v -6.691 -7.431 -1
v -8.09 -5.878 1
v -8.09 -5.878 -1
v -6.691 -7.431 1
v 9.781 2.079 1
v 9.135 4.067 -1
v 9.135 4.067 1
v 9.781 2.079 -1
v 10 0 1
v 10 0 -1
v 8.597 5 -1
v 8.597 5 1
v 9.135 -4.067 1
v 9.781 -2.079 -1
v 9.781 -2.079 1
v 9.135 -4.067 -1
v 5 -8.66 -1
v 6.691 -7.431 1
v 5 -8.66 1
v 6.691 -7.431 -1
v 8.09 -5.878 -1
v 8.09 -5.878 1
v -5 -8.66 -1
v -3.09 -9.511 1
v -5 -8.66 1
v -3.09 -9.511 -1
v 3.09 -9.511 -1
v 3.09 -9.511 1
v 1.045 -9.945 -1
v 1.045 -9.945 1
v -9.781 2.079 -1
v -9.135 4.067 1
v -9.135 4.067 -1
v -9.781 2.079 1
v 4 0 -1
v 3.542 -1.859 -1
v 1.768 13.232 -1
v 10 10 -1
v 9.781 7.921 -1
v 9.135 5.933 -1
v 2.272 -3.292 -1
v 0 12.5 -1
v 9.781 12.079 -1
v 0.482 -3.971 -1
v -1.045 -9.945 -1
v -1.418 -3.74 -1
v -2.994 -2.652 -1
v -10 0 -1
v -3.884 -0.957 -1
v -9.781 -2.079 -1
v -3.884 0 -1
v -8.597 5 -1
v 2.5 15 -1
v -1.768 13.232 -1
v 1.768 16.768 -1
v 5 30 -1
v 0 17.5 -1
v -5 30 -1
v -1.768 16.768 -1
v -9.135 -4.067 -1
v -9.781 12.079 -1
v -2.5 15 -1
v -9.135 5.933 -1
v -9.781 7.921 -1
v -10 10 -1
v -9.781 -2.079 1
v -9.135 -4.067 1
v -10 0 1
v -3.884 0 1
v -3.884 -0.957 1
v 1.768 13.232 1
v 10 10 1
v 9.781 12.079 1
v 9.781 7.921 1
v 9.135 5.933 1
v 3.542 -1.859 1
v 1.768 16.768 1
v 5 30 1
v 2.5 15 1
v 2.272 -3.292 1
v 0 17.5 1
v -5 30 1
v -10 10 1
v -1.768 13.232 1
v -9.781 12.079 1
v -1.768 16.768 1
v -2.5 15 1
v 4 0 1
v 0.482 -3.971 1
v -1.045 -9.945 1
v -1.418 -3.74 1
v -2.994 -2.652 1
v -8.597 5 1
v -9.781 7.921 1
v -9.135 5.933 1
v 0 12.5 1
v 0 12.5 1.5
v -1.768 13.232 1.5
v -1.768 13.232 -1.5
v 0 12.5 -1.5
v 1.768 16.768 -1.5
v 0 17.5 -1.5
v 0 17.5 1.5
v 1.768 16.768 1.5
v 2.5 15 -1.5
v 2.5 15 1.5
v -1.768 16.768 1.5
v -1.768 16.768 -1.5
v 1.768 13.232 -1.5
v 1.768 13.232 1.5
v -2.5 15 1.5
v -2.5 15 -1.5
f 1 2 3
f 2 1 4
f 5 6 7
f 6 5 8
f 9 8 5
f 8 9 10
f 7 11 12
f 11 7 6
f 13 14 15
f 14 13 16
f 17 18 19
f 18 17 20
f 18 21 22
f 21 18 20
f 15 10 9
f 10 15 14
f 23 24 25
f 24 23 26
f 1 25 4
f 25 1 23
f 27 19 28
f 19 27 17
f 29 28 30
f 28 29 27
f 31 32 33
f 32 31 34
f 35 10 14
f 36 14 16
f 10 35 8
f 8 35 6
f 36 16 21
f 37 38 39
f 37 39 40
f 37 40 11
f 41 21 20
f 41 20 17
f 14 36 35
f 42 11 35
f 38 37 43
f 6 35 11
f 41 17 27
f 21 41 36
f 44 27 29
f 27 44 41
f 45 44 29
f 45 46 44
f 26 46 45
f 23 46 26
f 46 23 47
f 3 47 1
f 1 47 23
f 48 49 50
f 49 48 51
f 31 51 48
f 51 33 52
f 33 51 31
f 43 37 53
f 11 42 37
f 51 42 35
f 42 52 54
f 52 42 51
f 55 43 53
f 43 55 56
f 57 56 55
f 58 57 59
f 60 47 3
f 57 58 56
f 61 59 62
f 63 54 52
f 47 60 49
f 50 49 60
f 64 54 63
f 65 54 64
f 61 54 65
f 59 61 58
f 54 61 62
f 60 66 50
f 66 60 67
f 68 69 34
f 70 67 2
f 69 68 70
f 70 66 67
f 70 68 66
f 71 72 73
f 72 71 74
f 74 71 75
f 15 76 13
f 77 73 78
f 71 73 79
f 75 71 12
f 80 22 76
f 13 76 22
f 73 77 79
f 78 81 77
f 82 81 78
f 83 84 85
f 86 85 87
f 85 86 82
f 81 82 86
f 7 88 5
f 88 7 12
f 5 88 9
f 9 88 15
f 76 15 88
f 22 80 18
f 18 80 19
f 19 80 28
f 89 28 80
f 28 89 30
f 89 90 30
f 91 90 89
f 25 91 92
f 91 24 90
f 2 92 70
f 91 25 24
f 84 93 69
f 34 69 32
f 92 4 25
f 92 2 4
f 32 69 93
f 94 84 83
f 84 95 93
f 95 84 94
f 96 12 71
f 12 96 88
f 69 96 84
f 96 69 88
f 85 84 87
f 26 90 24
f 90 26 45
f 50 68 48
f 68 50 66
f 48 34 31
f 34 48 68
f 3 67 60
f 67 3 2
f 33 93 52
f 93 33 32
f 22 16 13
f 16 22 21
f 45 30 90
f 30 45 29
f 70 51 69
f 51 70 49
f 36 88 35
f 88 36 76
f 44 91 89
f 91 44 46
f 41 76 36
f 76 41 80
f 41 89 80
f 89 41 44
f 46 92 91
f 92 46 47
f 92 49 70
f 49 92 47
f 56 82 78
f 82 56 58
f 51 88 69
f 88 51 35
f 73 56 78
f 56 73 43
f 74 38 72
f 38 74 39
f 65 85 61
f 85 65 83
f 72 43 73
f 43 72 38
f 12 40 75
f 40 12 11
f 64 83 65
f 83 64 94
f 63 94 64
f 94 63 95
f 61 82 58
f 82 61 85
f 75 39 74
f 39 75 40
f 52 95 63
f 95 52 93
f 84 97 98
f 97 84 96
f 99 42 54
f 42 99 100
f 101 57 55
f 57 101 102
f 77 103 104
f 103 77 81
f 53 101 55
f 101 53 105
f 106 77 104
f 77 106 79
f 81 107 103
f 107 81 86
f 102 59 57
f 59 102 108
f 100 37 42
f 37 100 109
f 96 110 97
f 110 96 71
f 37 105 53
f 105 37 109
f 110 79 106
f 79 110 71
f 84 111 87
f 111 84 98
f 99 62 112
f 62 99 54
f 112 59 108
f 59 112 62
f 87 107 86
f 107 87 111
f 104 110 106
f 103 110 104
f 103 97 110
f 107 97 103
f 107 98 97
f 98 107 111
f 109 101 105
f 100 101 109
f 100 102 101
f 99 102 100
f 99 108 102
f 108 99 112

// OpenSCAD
// Parameters
ring_outer_diameter = 20;
ring_thickness = 2;
mounting_hole_diameter = 8;
tongue_length = 30;
tongue_width = 10;
tongue_thickness = 2;
wire_entry_diameter = 5;

// Ring body
module ring_body() {
    difference() {
        cylinder(d=ring_outer_diameter, h=ring_thickness, center=true);
        cylinder(d=mounting_hole_diameter, h=ring_thickness + 1, center=true);
    }
}

// Wire termination section (tongue)
module wire_termination_section() {
    translate([0, tongue_length/2, 0])
    cube([tongue_width, tongue_length, tongue_thickness], center=true);
}

// Transition fillet or hull between ring and tongue
module transition_fillet() {
    hull() {
        translate([0, ring_outer_diameter/2, 0])
        cylinder(d=ring_outer_diameter, h=ring_thickness, center=true);
        translate([0, tongue_length/2, 0])
        cube([tongue_width, tongue_length, tongue_thickness], center=true);
    }
}

// Optional wire entry hole or slot in tongue
module wire_entry_hole() {
    translate([0, tongue_length/2, 0])
    cylinder(d=wire_entry_diameter, h=tongue_thickness + 1, center=true);
}

// Complete ring terminal assembly
module ring_terminal_assembly() {
    union() {
        ring_body();
        wire_termination_section();
        transition_fillet();
        wire_entry_hole();
    }
}

// Render the ring terminal
ring_terminal_assembly();
